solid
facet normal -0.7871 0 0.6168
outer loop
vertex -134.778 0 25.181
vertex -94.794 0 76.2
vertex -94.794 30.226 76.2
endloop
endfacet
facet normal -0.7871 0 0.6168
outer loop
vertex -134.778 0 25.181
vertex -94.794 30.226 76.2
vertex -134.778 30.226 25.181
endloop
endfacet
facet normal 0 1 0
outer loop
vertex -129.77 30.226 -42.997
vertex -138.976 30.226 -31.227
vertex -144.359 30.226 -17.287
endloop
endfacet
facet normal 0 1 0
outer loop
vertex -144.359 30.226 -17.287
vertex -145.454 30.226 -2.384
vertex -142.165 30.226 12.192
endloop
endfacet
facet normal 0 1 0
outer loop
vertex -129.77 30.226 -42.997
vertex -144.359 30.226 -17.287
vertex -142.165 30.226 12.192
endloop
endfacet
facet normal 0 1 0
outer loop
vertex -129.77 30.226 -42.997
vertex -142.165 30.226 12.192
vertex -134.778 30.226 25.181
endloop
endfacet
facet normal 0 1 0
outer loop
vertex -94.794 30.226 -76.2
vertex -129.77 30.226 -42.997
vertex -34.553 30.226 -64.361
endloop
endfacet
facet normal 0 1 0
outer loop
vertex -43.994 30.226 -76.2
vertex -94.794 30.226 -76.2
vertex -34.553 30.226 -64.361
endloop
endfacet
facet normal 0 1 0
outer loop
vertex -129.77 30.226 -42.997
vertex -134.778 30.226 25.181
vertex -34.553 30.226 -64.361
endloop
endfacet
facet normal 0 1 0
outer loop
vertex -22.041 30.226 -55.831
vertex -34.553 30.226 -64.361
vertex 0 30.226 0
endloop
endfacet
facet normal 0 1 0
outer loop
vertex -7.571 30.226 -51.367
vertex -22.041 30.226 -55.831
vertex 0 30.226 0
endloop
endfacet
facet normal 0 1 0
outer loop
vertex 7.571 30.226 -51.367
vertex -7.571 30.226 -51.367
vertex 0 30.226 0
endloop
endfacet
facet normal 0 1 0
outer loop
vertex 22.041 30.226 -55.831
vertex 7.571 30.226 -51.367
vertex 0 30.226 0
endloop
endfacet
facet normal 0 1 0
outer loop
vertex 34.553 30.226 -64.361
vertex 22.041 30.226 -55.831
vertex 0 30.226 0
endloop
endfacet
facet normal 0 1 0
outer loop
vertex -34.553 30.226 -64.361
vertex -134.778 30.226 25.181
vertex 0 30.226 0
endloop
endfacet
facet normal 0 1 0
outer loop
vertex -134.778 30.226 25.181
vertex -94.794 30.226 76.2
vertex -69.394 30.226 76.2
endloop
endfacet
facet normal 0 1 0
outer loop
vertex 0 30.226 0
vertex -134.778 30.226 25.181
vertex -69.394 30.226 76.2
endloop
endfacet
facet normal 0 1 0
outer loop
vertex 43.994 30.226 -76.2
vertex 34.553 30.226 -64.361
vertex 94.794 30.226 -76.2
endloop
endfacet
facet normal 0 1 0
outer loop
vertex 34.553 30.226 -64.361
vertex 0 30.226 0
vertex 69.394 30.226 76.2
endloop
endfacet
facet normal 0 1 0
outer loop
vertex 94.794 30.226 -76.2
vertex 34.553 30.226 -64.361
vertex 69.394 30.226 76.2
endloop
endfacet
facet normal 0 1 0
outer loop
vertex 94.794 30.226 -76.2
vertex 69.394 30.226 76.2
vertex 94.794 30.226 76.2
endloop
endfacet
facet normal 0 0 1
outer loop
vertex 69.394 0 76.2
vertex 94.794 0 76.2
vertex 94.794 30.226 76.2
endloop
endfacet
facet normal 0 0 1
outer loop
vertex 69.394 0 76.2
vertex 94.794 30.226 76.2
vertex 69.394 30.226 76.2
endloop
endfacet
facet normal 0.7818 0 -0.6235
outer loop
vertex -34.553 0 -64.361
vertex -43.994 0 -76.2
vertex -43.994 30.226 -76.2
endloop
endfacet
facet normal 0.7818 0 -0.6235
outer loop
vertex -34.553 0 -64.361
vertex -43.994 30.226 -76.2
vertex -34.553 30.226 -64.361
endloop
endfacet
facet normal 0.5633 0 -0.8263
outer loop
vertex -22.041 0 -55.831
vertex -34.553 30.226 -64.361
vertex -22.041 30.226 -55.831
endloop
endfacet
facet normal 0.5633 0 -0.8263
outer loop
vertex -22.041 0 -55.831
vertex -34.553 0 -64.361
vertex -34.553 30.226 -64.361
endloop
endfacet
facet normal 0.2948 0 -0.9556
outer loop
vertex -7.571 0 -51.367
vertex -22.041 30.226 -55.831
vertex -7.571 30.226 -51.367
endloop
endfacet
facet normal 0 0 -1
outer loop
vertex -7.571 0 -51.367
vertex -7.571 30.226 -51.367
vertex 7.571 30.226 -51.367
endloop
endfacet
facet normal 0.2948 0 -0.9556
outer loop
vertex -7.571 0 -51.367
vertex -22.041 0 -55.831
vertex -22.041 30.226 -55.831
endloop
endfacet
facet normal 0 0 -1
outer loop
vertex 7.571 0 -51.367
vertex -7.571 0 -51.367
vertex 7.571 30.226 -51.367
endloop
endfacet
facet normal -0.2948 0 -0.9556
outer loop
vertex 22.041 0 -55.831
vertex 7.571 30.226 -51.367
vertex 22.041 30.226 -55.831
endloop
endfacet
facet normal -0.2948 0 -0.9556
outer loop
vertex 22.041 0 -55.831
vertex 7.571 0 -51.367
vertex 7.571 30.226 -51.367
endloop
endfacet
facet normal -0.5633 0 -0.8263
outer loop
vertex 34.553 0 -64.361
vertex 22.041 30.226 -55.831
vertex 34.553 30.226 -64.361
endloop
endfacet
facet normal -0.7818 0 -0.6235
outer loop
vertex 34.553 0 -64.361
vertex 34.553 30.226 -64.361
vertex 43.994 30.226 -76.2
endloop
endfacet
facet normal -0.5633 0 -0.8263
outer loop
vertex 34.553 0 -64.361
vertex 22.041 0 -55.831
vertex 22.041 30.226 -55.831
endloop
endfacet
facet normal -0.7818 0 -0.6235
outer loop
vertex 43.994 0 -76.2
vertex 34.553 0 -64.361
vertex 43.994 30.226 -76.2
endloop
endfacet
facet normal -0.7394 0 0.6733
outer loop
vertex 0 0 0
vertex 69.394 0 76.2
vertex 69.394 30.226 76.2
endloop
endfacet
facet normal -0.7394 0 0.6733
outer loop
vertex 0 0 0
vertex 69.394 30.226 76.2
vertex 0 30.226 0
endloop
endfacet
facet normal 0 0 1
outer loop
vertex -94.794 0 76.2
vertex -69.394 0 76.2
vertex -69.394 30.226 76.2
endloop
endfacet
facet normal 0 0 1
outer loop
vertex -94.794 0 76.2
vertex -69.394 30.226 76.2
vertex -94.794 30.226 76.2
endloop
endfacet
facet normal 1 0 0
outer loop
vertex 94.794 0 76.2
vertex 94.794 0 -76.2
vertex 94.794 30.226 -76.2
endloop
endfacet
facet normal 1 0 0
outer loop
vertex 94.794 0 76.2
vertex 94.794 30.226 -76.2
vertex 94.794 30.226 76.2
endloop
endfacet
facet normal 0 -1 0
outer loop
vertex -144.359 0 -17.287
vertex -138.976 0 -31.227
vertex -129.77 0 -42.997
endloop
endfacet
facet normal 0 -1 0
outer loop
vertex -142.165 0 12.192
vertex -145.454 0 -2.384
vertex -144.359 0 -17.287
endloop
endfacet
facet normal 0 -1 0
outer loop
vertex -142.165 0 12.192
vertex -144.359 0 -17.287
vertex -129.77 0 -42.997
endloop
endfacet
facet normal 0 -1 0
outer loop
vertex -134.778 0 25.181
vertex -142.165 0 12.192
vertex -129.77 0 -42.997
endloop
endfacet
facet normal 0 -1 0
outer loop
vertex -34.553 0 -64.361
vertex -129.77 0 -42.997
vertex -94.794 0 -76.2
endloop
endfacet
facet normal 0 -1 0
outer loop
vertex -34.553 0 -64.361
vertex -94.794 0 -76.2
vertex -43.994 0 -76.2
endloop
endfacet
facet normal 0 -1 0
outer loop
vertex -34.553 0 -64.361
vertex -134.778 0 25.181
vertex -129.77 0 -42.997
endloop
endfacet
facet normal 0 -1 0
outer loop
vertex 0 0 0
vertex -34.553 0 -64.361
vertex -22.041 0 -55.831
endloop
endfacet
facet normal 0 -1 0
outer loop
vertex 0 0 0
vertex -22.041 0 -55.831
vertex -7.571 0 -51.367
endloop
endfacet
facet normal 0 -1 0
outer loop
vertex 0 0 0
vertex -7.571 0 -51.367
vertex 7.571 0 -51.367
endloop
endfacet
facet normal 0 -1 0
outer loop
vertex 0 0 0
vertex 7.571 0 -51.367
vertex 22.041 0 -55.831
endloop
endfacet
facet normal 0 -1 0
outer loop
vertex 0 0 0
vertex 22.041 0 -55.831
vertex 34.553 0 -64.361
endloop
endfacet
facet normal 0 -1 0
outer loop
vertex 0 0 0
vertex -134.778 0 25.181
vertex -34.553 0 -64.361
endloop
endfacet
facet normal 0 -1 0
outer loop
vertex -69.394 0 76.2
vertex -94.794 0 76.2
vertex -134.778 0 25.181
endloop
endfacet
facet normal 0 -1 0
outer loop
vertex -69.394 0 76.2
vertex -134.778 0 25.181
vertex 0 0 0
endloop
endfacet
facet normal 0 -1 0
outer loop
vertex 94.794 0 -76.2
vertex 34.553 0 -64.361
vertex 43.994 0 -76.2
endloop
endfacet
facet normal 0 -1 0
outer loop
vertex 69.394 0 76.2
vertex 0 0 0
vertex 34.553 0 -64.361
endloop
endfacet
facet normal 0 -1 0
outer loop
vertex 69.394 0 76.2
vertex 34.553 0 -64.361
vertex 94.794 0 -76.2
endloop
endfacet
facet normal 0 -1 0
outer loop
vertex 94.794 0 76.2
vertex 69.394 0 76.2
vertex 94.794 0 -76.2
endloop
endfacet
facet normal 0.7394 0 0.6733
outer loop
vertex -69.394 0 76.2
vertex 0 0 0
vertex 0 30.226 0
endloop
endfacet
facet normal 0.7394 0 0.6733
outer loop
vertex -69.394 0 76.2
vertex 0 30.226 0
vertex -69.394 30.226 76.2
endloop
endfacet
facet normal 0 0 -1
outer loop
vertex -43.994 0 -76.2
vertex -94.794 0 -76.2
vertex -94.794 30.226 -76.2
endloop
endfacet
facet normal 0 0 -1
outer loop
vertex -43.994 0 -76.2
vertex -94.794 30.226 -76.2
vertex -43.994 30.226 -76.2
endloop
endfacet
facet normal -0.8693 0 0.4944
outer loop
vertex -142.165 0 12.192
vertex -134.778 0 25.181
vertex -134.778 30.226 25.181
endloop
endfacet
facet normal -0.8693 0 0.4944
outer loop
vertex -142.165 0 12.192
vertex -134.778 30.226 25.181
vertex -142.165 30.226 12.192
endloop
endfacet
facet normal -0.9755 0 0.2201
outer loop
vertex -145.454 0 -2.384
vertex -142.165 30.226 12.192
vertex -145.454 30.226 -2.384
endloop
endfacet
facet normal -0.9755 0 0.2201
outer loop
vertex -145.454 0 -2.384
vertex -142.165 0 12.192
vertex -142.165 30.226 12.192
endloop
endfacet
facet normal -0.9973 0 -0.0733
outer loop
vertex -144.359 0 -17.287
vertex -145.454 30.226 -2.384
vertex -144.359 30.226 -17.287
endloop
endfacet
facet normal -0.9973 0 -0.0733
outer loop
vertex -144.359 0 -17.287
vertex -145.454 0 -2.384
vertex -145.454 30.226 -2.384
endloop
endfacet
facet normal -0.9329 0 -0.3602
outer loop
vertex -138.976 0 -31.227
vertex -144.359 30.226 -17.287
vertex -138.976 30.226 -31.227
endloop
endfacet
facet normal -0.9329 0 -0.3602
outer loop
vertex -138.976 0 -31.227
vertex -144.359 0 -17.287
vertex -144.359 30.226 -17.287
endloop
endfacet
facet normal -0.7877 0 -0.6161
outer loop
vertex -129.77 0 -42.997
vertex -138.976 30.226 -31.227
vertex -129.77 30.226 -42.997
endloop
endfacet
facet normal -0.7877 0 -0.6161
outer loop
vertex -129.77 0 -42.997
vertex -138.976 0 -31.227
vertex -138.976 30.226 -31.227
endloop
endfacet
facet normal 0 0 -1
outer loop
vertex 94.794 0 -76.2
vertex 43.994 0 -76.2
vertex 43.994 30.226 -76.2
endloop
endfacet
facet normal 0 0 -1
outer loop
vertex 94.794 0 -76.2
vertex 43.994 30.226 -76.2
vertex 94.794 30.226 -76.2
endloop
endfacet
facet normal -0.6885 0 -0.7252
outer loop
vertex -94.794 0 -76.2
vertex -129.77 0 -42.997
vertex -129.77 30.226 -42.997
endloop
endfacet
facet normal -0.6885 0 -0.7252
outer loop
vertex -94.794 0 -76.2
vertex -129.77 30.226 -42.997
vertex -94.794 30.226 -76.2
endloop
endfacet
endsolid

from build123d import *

# Parameters (mm, degrees)
F1_DEPTH = 30.226


with BuildPart() as f1:
    # F0 (on Front) → F1 (new body)
    with BuildSketch(Plane.XZ):
        with BuildLine():
            Line((69.394091, 76.2), (0, 0))
            Line((0, 0), (-69.394091, 76.2))
            Line((-69.394091, 76.2), (-94.794091, 76.2))
            Line((-94.794091, 76.2), (-134.777937, 25.181414))
            ThreePointArc((-134.777937, 25.181414), (-145.457577, -9.876098), (-129.769607, -42.996657))
            Line((-129.769607, -42.996657), (-94.794091, -76.2))
            Line((-94.794091, -76.2), (-43.994091, -76.2))
            ThreePointArc((-43.994091, -76.2), (0, -50.8), (43.994091, -76.2))
            Line((43.994091, -76.2), (94.794091, -76.2))
            Line((94.794091, -76.2), (94.794091, 76.2))
            Line((94.794091, 76.2), (69.394091, 76.2))
        make_face()
    extrude(amount=-F1_DEPTH)


solid = f1.part
